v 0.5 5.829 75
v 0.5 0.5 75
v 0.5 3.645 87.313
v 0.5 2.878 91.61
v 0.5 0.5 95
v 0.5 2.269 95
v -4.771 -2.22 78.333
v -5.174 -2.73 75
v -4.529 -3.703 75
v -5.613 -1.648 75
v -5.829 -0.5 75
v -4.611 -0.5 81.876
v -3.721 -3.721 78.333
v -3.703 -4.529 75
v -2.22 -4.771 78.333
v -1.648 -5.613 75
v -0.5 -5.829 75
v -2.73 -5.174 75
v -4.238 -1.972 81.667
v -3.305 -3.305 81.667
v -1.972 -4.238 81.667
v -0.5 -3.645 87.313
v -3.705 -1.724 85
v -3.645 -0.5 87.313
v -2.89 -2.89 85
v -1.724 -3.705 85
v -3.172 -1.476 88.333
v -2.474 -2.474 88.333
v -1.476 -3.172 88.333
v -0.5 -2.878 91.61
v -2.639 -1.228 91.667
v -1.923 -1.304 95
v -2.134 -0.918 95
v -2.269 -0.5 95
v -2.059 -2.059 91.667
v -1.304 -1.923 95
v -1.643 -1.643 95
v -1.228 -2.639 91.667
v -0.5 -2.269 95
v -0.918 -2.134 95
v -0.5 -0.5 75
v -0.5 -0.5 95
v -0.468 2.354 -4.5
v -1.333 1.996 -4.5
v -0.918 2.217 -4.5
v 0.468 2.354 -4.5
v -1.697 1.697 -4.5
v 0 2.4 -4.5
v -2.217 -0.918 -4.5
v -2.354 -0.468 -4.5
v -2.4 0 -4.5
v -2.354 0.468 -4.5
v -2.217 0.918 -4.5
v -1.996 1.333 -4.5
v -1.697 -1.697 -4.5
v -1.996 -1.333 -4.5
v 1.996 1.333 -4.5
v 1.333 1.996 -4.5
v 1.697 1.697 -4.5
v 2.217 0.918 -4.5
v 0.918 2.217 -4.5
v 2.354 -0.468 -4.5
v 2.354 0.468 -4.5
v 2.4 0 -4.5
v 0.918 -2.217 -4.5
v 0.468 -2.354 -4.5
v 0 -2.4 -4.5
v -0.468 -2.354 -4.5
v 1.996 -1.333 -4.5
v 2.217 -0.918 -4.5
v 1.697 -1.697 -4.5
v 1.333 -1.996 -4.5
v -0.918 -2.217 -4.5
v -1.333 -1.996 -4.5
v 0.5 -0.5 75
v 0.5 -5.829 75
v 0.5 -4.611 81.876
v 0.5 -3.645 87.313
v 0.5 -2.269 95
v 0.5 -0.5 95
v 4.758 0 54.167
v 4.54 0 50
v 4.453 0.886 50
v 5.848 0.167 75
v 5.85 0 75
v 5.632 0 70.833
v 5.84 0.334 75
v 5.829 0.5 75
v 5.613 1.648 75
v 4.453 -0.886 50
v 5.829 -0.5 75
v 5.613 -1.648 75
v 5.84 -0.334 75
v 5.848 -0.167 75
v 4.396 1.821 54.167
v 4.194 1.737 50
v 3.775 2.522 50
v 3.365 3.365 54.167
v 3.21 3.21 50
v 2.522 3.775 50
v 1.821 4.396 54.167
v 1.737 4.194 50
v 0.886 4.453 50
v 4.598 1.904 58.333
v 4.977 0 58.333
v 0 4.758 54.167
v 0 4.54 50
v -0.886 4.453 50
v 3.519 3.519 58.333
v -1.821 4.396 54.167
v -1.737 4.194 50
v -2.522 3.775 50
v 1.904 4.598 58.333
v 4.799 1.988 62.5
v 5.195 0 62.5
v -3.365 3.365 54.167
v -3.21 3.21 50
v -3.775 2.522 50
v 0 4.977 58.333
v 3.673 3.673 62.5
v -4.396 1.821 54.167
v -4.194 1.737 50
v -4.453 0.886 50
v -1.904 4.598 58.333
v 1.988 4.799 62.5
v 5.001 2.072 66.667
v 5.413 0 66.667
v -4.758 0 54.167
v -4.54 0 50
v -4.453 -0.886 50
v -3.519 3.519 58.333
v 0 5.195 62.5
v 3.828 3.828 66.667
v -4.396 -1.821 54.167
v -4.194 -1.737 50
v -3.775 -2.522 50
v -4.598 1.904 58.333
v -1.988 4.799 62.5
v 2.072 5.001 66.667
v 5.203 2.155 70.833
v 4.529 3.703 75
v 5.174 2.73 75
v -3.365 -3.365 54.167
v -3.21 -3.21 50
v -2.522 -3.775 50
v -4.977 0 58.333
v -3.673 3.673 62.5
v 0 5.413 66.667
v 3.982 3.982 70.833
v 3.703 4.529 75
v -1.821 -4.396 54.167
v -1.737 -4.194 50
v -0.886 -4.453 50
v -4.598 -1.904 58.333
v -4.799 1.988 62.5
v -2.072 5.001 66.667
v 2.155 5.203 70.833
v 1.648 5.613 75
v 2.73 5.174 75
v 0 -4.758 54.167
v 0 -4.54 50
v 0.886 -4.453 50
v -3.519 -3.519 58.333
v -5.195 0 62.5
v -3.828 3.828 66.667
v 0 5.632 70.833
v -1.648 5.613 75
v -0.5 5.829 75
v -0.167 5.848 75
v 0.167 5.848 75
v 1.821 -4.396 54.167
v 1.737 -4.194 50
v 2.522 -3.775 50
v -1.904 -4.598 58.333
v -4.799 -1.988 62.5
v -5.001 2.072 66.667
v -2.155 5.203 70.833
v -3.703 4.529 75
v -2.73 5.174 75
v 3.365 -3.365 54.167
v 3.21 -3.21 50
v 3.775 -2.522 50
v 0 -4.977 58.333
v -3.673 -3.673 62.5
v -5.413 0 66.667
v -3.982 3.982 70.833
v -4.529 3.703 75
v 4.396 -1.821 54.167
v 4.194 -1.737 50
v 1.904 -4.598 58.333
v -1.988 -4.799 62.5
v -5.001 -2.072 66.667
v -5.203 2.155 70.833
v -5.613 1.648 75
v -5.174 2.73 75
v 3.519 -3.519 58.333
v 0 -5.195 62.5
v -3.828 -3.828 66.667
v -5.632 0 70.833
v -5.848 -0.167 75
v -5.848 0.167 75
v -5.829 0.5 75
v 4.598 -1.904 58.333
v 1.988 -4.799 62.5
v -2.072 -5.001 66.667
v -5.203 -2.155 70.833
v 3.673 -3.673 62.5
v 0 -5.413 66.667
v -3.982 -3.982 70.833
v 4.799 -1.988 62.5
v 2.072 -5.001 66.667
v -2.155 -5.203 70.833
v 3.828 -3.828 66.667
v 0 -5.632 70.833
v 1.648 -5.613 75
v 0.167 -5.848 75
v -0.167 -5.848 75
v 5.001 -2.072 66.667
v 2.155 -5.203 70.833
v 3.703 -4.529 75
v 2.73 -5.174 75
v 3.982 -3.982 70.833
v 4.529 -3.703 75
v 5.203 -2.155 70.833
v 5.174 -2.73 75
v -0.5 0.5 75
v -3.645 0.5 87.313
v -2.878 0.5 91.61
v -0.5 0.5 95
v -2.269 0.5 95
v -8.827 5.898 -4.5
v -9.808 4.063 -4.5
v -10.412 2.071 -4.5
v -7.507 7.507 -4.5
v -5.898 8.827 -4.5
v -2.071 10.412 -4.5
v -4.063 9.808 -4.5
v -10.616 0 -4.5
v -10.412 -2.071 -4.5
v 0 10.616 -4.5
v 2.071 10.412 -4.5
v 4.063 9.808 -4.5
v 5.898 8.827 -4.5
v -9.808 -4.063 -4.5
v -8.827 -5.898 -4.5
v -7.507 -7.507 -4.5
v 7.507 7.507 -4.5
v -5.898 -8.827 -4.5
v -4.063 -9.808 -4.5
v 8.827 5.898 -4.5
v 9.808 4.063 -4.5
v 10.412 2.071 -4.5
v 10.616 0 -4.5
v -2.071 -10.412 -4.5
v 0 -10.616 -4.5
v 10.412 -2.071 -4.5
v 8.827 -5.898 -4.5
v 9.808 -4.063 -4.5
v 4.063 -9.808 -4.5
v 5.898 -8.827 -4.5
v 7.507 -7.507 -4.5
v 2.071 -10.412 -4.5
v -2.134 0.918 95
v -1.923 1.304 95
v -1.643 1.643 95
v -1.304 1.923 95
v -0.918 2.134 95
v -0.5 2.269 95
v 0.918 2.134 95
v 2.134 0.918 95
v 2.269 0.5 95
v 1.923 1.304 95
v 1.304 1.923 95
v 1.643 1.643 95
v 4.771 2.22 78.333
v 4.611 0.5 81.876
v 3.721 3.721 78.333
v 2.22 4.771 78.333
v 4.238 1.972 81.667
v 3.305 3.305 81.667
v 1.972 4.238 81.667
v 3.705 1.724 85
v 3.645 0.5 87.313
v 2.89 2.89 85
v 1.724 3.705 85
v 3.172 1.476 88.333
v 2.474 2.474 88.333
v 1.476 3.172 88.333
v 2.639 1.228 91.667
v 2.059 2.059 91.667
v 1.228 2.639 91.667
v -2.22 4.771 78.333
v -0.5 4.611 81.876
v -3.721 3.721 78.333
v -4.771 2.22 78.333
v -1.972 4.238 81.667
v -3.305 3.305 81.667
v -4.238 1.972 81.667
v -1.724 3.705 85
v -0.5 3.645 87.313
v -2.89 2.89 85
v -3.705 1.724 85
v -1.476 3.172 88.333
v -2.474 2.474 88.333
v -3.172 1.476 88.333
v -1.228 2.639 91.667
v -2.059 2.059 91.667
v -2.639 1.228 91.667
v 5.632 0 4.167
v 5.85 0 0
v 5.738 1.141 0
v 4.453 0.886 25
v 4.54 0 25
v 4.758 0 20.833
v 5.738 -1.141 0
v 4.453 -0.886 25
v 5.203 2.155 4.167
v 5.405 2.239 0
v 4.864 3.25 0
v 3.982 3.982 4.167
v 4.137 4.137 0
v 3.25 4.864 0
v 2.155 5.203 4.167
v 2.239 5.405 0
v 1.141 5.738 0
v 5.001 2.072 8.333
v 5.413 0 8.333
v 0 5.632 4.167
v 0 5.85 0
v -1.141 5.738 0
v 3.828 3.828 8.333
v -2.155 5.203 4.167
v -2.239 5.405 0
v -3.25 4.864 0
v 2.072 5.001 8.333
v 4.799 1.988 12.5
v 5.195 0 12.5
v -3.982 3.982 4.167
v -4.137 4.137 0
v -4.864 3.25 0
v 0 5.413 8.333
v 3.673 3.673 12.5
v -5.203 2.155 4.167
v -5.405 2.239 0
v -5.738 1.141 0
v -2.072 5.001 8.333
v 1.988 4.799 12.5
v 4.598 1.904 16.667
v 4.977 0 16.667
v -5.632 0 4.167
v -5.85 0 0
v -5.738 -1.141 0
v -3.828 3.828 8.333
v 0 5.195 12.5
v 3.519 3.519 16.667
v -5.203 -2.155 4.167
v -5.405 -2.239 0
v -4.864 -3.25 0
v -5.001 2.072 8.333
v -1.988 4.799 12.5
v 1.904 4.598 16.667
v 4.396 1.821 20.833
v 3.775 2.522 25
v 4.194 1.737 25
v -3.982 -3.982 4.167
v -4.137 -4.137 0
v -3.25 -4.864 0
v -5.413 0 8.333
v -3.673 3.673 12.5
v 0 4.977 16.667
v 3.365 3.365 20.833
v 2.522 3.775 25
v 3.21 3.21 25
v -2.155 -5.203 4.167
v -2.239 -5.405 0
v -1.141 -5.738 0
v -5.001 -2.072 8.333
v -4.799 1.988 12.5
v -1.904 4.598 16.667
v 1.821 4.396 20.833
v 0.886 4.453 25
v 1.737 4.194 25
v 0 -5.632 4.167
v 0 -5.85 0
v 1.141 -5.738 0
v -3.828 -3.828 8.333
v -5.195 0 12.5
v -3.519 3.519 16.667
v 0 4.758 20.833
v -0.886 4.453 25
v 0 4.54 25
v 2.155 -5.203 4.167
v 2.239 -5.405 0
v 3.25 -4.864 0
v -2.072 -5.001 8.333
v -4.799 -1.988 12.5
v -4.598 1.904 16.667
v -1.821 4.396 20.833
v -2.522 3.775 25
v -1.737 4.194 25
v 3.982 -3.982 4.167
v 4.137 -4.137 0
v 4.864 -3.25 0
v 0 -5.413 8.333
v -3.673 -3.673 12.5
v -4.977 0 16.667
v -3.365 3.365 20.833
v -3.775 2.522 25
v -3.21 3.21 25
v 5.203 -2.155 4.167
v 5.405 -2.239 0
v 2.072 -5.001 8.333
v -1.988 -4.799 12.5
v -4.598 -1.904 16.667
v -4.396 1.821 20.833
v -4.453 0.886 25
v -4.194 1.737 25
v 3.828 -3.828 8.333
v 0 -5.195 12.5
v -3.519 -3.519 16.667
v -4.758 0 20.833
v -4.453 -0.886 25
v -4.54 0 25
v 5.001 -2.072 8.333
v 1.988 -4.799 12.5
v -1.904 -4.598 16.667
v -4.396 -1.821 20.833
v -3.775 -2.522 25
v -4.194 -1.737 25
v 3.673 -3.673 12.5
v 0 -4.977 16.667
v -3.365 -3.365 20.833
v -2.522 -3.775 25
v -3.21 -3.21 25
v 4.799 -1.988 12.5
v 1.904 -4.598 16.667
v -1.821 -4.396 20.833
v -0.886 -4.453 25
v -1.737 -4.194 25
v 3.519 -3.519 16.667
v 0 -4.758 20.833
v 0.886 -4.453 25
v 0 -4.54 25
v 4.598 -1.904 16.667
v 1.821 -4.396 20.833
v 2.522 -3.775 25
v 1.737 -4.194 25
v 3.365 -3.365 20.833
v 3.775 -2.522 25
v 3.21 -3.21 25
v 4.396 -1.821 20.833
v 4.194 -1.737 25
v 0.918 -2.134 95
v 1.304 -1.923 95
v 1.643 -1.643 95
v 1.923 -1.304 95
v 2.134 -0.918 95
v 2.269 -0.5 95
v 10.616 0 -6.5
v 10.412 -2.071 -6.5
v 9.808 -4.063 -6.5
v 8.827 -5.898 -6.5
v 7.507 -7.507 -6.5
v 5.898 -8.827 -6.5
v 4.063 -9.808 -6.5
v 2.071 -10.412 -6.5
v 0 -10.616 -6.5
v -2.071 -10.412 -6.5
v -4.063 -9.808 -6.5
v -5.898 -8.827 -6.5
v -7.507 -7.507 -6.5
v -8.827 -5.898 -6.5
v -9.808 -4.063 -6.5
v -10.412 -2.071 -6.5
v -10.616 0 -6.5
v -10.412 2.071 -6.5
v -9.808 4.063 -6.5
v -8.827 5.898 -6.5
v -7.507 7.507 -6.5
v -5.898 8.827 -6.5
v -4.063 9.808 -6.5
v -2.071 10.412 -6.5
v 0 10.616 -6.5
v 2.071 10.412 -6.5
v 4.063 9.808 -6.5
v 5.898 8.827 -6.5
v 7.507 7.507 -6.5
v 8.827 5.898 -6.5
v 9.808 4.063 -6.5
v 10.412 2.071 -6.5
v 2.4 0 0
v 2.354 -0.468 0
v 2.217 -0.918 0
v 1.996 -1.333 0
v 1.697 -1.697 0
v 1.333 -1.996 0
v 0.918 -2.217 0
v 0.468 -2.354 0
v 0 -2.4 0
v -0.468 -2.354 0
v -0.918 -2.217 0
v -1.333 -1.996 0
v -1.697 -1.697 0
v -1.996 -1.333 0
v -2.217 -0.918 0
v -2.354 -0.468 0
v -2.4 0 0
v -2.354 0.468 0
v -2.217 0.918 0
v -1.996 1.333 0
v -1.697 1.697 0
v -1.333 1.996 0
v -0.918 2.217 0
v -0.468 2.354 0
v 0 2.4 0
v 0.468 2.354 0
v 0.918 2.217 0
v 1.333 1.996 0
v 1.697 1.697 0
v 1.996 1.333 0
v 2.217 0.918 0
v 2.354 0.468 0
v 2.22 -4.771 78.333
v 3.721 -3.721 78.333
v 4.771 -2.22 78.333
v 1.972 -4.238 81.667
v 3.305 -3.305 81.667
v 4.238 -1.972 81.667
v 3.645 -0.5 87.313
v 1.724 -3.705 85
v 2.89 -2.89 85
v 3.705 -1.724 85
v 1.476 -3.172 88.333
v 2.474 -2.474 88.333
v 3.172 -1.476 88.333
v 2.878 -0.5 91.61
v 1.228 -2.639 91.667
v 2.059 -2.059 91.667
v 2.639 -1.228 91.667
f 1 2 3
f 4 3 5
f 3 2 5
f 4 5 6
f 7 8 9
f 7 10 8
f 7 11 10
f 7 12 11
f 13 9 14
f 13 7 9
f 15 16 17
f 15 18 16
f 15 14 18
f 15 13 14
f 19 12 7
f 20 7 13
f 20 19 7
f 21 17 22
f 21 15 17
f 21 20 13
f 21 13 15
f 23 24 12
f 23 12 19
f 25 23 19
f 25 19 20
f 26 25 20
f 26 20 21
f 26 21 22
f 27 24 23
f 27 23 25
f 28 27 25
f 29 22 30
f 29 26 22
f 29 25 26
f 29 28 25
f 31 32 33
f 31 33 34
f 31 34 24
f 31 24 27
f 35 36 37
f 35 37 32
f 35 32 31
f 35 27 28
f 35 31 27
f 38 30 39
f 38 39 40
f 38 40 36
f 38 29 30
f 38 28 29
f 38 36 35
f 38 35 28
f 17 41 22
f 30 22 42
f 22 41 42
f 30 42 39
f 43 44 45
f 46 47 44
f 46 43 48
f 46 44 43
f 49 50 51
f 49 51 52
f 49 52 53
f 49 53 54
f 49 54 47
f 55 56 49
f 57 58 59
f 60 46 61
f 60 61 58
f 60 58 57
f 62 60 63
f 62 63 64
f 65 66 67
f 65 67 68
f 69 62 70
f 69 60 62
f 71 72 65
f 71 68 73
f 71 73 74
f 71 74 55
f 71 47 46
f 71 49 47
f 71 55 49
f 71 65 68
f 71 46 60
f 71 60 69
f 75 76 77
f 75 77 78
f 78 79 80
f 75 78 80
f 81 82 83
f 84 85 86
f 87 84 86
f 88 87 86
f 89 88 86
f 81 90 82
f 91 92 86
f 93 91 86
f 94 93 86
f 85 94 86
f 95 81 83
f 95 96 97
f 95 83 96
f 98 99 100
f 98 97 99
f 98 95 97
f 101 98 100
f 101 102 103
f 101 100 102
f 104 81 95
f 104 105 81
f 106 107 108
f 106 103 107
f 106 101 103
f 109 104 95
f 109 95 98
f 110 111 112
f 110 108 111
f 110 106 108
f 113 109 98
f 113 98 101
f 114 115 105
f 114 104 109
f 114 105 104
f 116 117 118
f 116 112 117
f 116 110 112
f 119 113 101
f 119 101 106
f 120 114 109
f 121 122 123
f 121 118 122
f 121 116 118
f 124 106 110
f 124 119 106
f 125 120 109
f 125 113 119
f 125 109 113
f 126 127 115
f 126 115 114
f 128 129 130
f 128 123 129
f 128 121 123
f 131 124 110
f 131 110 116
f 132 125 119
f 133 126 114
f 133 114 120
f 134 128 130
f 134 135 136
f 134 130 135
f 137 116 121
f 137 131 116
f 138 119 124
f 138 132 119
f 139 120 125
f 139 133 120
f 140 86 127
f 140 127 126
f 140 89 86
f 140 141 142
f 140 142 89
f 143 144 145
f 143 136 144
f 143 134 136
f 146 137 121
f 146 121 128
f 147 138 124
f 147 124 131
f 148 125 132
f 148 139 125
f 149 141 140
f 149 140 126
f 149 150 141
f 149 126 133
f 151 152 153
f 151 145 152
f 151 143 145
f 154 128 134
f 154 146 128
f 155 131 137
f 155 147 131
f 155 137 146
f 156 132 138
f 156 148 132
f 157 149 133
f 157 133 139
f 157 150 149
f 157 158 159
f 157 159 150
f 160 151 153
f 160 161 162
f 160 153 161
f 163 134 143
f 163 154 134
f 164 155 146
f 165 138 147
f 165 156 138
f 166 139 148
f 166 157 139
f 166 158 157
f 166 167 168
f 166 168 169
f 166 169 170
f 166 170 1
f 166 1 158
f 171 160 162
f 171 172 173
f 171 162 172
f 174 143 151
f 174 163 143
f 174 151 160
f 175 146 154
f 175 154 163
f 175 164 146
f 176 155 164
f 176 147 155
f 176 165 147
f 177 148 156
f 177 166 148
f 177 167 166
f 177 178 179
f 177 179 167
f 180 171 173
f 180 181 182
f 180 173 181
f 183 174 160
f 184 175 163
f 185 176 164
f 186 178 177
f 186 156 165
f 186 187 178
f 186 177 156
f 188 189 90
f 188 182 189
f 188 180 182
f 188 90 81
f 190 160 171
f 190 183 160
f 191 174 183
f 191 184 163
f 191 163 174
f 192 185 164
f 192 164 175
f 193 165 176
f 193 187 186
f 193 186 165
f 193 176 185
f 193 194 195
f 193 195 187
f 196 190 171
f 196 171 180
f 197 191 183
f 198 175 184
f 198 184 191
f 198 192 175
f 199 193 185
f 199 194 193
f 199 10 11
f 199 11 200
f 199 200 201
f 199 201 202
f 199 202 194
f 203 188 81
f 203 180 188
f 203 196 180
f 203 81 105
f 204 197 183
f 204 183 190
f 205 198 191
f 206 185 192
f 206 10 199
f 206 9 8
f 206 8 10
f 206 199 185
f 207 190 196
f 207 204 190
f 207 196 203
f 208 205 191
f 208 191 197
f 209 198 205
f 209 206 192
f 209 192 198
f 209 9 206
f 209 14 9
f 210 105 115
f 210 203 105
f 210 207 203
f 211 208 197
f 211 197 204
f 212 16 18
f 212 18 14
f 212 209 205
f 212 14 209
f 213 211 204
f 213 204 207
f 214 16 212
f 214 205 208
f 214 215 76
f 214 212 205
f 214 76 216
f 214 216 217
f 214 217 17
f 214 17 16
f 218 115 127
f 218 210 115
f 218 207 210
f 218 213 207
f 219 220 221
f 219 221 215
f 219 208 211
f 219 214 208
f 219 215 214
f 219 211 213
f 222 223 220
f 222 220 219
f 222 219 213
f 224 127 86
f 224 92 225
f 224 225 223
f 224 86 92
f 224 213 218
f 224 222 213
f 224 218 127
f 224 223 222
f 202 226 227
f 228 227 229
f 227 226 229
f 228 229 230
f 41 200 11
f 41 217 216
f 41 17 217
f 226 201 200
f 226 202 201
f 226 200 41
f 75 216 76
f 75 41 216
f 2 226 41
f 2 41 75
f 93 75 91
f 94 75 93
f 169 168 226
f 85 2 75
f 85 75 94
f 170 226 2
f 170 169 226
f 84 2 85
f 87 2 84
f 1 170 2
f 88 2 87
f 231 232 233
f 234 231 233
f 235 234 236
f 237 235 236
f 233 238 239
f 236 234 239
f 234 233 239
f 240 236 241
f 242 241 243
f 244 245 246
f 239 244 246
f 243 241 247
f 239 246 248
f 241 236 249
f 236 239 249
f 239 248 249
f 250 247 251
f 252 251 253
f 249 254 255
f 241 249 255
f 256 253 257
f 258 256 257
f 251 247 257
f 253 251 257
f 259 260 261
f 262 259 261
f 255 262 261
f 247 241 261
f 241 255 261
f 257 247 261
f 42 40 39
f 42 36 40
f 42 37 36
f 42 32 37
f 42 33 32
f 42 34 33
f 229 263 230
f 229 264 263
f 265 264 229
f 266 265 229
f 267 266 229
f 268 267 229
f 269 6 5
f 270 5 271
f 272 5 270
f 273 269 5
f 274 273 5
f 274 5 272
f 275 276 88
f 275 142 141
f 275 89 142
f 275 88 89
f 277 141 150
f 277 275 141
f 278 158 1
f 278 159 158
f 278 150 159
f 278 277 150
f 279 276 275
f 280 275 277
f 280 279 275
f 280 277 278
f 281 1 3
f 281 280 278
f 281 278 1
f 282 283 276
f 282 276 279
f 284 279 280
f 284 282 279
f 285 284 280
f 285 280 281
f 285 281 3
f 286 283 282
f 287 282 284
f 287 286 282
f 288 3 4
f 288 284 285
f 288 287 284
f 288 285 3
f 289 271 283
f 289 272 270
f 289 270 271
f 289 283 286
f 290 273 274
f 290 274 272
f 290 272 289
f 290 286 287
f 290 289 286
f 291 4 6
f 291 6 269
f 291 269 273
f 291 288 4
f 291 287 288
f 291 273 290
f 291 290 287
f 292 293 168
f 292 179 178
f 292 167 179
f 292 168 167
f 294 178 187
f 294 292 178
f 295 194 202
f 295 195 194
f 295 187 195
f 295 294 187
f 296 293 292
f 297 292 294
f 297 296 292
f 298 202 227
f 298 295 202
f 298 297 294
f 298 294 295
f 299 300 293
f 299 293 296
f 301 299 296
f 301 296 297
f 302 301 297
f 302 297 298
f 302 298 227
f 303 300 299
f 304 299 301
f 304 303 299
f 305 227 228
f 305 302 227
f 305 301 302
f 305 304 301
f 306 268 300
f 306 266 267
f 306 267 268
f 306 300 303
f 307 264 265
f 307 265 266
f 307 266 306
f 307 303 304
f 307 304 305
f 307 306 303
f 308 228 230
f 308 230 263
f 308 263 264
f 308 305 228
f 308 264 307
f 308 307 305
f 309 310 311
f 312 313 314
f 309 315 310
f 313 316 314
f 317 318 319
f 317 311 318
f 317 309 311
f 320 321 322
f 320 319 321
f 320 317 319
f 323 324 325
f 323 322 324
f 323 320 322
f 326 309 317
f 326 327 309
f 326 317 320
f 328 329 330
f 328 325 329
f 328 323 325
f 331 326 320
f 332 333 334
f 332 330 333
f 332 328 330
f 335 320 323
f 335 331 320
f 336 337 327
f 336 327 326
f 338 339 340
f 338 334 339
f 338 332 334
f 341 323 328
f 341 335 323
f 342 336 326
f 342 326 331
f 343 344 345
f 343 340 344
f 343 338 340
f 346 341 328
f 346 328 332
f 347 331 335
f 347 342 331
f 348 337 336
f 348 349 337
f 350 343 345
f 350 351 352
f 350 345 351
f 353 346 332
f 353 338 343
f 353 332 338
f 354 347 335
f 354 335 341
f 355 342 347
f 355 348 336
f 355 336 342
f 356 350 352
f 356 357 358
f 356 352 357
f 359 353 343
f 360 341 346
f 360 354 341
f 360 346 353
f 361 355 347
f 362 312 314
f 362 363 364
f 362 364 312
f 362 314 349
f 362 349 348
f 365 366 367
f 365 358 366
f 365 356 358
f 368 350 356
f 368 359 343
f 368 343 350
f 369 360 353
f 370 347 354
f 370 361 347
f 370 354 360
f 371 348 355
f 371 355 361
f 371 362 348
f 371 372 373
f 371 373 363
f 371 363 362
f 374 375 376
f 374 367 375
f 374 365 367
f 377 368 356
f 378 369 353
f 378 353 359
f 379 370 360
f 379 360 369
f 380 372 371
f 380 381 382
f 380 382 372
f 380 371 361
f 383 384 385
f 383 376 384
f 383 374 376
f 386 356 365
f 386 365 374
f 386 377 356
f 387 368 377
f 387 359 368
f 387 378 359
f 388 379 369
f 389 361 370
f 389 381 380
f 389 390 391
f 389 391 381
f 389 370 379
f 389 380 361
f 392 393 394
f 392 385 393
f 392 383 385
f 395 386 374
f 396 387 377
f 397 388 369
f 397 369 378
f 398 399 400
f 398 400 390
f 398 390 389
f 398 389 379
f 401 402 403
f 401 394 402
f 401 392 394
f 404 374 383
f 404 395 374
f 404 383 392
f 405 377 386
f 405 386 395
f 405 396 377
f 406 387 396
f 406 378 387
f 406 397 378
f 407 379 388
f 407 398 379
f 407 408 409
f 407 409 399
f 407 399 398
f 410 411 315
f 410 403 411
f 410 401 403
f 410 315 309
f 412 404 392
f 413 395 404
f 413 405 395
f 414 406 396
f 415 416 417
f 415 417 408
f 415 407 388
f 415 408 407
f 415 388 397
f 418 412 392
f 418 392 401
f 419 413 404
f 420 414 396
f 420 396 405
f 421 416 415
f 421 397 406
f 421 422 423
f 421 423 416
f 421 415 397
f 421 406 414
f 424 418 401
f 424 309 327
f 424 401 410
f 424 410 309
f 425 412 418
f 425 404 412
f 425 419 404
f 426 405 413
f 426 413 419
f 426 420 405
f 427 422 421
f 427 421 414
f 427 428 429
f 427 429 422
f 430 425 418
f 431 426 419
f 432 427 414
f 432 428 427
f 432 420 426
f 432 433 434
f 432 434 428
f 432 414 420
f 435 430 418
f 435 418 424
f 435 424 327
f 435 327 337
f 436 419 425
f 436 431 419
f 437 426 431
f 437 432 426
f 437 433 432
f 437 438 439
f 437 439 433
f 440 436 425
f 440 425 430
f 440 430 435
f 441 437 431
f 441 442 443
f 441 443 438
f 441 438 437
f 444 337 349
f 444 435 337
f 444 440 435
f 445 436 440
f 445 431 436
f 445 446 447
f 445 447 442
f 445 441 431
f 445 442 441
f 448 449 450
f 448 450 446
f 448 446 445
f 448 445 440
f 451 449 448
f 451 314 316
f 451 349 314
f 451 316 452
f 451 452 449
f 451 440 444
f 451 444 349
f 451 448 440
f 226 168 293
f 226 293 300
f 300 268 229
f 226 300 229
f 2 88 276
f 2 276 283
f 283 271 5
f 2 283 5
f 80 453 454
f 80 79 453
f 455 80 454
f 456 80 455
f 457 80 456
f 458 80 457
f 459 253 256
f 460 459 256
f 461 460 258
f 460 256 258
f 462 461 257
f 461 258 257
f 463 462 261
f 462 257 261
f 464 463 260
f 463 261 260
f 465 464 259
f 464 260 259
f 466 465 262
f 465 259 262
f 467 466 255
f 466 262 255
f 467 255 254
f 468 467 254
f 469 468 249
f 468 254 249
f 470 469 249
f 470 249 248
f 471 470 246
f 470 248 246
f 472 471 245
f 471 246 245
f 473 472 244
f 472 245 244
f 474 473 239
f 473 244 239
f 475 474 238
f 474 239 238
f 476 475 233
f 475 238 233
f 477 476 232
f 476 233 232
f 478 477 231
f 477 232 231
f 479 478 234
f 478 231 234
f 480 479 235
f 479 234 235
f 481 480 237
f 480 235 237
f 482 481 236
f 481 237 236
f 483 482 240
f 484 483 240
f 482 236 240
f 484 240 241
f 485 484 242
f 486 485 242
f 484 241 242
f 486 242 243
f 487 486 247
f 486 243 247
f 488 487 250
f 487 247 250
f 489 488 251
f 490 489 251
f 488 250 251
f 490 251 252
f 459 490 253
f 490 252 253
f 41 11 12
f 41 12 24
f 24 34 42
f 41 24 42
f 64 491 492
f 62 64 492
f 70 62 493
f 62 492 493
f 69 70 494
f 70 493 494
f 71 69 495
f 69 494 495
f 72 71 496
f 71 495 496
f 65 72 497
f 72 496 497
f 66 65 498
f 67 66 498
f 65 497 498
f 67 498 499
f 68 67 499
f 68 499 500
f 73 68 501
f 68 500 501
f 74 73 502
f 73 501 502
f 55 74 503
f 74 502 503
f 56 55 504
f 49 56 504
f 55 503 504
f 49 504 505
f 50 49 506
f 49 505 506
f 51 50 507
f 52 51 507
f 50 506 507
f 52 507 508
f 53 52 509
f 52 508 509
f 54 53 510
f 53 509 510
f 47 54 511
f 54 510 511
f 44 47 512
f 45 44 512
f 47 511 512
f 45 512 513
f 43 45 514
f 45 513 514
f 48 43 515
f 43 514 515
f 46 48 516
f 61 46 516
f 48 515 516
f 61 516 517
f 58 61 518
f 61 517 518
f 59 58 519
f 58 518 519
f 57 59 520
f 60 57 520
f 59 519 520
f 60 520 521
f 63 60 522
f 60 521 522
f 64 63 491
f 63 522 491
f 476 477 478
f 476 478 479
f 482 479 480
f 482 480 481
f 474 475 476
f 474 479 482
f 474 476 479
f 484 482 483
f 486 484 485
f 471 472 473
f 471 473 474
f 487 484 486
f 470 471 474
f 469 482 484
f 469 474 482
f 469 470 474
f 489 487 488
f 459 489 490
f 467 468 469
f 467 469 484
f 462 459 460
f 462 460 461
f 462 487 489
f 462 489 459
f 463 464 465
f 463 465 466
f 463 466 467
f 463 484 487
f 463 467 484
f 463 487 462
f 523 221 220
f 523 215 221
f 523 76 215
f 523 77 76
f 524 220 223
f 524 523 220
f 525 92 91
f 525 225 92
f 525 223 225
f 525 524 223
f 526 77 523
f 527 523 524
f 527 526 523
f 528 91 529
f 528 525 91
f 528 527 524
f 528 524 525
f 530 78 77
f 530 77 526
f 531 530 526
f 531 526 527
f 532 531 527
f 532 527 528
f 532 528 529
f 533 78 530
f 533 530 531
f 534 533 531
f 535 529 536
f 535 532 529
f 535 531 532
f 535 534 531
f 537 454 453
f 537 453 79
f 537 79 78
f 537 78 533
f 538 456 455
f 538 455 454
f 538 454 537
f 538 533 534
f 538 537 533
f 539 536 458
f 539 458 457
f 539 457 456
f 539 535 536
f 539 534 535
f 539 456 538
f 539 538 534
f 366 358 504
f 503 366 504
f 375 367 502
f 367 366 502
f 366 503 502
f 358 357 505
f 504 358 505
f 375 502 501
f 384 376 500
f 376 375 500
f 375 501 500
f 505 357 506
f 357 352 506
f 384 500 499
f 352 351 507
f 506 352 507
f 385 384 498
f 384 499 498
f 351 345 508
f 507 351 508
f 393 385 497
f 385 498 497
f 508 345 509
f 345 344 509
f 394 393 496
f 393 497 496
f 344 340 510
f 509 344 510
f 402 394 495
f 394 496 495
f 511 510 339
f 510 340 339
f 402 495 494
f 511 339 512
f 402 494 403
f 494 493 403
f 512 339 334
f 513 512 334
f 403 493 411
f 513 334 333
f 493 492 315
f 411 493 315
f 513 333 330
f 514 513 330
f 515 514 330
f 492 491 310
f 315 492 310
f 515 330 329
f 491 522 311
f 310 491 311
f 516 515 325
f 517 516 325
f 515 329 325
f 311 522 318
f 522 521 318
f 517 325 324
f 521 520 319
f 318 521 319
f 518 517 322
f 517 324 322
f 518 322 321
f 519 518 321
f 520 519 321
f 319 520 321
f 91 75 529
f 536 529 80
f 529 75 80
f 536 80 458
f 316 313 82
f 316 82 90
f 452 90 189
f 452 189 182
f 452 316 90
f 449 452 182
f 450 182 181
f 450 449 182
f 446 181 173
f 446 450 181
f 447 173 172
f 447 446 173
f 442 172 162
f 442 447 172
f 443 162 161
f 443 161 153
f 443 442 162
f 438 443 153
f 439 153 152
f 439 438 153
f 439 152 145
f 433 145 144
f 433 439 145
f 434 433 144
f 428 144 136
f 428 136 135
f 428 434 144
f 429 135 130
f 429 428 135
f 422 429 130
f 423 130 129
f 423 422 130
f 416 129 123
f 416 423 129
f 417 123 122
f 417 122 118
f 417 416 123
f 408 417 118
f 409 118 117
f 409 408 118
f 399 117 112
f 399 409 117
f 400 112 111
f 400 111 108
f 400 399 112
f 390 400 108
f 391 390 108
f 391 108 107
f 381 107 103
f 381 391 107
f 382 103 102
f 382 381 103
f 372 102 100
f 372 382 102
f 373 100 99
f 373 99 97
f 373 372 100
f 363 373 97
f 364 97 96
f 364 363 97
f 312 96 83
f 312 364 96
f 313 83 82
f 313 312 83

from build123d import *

# Parameters (mm, degrees)
F0_R      = 5.85
F1_DEPTH  = 25
F1_TAPER  = 3
F2_DEPTH  = 25
F2_FACE_R = 4.5398055179
F3_DEPTH  = 25
F3_TAPER  = -3
F4_R      = 2.4
F5_DEPTH  = 4.5
F3_FACE_R = 5.85
F6_DEPTH  = 20
F6_TAPER  = 10
F7_W      = 1
F7_H      = 1
F8_DEPTH  = 20
F9_R      = 10.6162207862
F9_R_2    = 2.4
F10_DEPTH = 2


with BuildPart() as f1:
    # F0 (on Top) → F1 (new body)
    with BuildSketch(Plane.XY):
        Circle(F0_R)
    extrude(amount=F1_DEPTH, taper=F1_TAPER)

    # F2 (add): a face of the model
    f2_faces = [f1.faces().sort_by_distance(p)[0] for p in [
        (0, 0, 25),
    ]]
    extrude(f2_faces, amount=F2_DEPTH)

    # F2_face (on face) → F3 (join)
    with BuildSketch(Plane.XY.offset(50)):
        Circle(F2_FACE_R)
    extrude(amount=F3_DEPTH, taper=F3_TAPER)

    # F4 (on face) → F5 (join)
    with BuildSketch(Plane(origin=(0, 0, 0), x_dir=(1, 0, 0), z_dir=(0, 0, -1))):
        Circle(F4_R)
    extrude(amount=F5_DEPTH)

    # F3_face (on face) → F6 (join)
    with BuildSketch(Plane.XY.offset(75)):
        Circle(F3_FACE_R)
    extrude(amount=F6_DEPTH, taper=F6_TAPER)

    # F7 (on face) → F8 (cut)
    with BuildSketch(Plane.XY.offset(95)):
        with BuildLine():
            Line((-0.5, 2.2690236148), (-0.5, 0.5))
            Line((-0.5, 0.5), (0.5, 0.5))
            Line((0.5, 0.5), (0.5, 2.2690236148))
            ThreePointArc((0.5, 2.2690236148), (0, 2.3234603858), (-0.5, 2.2690236148))
        make_face()
        with BuildLine():
            ThreePointArc((-2.2690236148, 0.5), (-2.3234603858, 0), (-2.2690236148, -0.5))
            Line((-2.2690236148, -0.5), (-0.5, -0.5))
            Line((-0.5, -0.5), (-0.5, 0.5))
            Line((-0.5, 0.5), (-2.2690236148, 0.5))
        make_face()
        with BuildLine():
            Line((0.5, -0.5), (-0.5, -0.5))
            Line((-0.5, -0.5), (-0.5, -2.2690236148))
            ThreePointArc((-0.5, -2.2690236148), (0, -2.3234603858), (0.5, -2.2690236148))
            Line((0.5, -2.2690236148), (0.5, -0.5))
        make_face()
        with BuildLine():
            Line((0.5, 0.5), (0.5, -0.5))
            Line((0.5, -0.5), (2.2690236148, -0.5))
            ThreePointArc((2.2690236148, -0.5), (2.3098111014, -0.2514773161), (2.3234603858, 0))
            ThreePointArc((2.3234603858, 0), (2.3098111014, 0.2514773161), (2.2690236148, 0.5))
            Line((2.2690236148, 0.5), (0.5, 0.5))
        make_face()
        Rectangle(F7_W, F7_H)
        with BuildLine():
            Line((-10.1169492777, 0.5), (-10.1169492777, -0.5))
            Line((-10.1169492777, -0.5), (-2.2690236148, -0.5))
            ThreePointArc((-2.2690236148, -0.5), (-2.3234603858, 0), (-2.2690236148, 0.5))
            Line((-2.2690236148, 0.5), (-10.1169492777, 0.5))
        make_face()
        with BuildLine():
            ThreePointArc((0.5, -2.2690236148), (0, -2.3234603858), (-0.5, -2.2690236148))
            Line((-0.5, -2.2690236148), (-0.5, -11.6822896525))
            Line((-0.5, -11.6822896525), (0.5, -11.6822896525))
            Line((0.5, -11.6822896525), (0.5, -2.2690236148))
        make_face()
        with BuildLine():
            ThreePointArc((2.3234603858, 0), (2.3098111014, -0.2514773161), (2.2690236148, -0.5))
            Line((2.2690236148, -0.5), (10.1169492777, -0.5))
            Line((10.1169492777, -0.5), (10.1169492777, 0.5))
            Line((10.1169492777, 0.5), (2.2690236148, 0.5))
            ThreePointArc((2.2690236148, 0.5), (2.3098111014, 0.2514773161), (2.3234603858, 0))
        make_face()
        with BuildLine():
            Line((-0.5, 11.6822896525), (-0.5, 2.2690236148))
            ThreePointArc((-0.5, 2.2690236148), (0, 2.3234603858), (0.5, 2.2690236148))
            Line((0.5, 2.2690236148), (0.5, 11.6822896525))
            Line((0.5, 11.6822896525), (-0.5, 11.6822896525))
        make_face()
    extrude(amount=-F8_DEPTH, mode=Mode.SUBTRACT)


with BuildPart() as f10:
    # F9 (on face) → F10 (new body)
    with BuildSketch(Plane(origin=(0, 0, -4.5), x_dir=(1, 0, 0), z_dir=(0, 0, -1))):
        Circle(F9_R)
        Circle(F9_R_2, mode=Mode.SUBTRACT)
        Circle(F9_R_2)
    extrude(amount=F10_DEPTH)


solid = Compound([f1.part, f10.part])
